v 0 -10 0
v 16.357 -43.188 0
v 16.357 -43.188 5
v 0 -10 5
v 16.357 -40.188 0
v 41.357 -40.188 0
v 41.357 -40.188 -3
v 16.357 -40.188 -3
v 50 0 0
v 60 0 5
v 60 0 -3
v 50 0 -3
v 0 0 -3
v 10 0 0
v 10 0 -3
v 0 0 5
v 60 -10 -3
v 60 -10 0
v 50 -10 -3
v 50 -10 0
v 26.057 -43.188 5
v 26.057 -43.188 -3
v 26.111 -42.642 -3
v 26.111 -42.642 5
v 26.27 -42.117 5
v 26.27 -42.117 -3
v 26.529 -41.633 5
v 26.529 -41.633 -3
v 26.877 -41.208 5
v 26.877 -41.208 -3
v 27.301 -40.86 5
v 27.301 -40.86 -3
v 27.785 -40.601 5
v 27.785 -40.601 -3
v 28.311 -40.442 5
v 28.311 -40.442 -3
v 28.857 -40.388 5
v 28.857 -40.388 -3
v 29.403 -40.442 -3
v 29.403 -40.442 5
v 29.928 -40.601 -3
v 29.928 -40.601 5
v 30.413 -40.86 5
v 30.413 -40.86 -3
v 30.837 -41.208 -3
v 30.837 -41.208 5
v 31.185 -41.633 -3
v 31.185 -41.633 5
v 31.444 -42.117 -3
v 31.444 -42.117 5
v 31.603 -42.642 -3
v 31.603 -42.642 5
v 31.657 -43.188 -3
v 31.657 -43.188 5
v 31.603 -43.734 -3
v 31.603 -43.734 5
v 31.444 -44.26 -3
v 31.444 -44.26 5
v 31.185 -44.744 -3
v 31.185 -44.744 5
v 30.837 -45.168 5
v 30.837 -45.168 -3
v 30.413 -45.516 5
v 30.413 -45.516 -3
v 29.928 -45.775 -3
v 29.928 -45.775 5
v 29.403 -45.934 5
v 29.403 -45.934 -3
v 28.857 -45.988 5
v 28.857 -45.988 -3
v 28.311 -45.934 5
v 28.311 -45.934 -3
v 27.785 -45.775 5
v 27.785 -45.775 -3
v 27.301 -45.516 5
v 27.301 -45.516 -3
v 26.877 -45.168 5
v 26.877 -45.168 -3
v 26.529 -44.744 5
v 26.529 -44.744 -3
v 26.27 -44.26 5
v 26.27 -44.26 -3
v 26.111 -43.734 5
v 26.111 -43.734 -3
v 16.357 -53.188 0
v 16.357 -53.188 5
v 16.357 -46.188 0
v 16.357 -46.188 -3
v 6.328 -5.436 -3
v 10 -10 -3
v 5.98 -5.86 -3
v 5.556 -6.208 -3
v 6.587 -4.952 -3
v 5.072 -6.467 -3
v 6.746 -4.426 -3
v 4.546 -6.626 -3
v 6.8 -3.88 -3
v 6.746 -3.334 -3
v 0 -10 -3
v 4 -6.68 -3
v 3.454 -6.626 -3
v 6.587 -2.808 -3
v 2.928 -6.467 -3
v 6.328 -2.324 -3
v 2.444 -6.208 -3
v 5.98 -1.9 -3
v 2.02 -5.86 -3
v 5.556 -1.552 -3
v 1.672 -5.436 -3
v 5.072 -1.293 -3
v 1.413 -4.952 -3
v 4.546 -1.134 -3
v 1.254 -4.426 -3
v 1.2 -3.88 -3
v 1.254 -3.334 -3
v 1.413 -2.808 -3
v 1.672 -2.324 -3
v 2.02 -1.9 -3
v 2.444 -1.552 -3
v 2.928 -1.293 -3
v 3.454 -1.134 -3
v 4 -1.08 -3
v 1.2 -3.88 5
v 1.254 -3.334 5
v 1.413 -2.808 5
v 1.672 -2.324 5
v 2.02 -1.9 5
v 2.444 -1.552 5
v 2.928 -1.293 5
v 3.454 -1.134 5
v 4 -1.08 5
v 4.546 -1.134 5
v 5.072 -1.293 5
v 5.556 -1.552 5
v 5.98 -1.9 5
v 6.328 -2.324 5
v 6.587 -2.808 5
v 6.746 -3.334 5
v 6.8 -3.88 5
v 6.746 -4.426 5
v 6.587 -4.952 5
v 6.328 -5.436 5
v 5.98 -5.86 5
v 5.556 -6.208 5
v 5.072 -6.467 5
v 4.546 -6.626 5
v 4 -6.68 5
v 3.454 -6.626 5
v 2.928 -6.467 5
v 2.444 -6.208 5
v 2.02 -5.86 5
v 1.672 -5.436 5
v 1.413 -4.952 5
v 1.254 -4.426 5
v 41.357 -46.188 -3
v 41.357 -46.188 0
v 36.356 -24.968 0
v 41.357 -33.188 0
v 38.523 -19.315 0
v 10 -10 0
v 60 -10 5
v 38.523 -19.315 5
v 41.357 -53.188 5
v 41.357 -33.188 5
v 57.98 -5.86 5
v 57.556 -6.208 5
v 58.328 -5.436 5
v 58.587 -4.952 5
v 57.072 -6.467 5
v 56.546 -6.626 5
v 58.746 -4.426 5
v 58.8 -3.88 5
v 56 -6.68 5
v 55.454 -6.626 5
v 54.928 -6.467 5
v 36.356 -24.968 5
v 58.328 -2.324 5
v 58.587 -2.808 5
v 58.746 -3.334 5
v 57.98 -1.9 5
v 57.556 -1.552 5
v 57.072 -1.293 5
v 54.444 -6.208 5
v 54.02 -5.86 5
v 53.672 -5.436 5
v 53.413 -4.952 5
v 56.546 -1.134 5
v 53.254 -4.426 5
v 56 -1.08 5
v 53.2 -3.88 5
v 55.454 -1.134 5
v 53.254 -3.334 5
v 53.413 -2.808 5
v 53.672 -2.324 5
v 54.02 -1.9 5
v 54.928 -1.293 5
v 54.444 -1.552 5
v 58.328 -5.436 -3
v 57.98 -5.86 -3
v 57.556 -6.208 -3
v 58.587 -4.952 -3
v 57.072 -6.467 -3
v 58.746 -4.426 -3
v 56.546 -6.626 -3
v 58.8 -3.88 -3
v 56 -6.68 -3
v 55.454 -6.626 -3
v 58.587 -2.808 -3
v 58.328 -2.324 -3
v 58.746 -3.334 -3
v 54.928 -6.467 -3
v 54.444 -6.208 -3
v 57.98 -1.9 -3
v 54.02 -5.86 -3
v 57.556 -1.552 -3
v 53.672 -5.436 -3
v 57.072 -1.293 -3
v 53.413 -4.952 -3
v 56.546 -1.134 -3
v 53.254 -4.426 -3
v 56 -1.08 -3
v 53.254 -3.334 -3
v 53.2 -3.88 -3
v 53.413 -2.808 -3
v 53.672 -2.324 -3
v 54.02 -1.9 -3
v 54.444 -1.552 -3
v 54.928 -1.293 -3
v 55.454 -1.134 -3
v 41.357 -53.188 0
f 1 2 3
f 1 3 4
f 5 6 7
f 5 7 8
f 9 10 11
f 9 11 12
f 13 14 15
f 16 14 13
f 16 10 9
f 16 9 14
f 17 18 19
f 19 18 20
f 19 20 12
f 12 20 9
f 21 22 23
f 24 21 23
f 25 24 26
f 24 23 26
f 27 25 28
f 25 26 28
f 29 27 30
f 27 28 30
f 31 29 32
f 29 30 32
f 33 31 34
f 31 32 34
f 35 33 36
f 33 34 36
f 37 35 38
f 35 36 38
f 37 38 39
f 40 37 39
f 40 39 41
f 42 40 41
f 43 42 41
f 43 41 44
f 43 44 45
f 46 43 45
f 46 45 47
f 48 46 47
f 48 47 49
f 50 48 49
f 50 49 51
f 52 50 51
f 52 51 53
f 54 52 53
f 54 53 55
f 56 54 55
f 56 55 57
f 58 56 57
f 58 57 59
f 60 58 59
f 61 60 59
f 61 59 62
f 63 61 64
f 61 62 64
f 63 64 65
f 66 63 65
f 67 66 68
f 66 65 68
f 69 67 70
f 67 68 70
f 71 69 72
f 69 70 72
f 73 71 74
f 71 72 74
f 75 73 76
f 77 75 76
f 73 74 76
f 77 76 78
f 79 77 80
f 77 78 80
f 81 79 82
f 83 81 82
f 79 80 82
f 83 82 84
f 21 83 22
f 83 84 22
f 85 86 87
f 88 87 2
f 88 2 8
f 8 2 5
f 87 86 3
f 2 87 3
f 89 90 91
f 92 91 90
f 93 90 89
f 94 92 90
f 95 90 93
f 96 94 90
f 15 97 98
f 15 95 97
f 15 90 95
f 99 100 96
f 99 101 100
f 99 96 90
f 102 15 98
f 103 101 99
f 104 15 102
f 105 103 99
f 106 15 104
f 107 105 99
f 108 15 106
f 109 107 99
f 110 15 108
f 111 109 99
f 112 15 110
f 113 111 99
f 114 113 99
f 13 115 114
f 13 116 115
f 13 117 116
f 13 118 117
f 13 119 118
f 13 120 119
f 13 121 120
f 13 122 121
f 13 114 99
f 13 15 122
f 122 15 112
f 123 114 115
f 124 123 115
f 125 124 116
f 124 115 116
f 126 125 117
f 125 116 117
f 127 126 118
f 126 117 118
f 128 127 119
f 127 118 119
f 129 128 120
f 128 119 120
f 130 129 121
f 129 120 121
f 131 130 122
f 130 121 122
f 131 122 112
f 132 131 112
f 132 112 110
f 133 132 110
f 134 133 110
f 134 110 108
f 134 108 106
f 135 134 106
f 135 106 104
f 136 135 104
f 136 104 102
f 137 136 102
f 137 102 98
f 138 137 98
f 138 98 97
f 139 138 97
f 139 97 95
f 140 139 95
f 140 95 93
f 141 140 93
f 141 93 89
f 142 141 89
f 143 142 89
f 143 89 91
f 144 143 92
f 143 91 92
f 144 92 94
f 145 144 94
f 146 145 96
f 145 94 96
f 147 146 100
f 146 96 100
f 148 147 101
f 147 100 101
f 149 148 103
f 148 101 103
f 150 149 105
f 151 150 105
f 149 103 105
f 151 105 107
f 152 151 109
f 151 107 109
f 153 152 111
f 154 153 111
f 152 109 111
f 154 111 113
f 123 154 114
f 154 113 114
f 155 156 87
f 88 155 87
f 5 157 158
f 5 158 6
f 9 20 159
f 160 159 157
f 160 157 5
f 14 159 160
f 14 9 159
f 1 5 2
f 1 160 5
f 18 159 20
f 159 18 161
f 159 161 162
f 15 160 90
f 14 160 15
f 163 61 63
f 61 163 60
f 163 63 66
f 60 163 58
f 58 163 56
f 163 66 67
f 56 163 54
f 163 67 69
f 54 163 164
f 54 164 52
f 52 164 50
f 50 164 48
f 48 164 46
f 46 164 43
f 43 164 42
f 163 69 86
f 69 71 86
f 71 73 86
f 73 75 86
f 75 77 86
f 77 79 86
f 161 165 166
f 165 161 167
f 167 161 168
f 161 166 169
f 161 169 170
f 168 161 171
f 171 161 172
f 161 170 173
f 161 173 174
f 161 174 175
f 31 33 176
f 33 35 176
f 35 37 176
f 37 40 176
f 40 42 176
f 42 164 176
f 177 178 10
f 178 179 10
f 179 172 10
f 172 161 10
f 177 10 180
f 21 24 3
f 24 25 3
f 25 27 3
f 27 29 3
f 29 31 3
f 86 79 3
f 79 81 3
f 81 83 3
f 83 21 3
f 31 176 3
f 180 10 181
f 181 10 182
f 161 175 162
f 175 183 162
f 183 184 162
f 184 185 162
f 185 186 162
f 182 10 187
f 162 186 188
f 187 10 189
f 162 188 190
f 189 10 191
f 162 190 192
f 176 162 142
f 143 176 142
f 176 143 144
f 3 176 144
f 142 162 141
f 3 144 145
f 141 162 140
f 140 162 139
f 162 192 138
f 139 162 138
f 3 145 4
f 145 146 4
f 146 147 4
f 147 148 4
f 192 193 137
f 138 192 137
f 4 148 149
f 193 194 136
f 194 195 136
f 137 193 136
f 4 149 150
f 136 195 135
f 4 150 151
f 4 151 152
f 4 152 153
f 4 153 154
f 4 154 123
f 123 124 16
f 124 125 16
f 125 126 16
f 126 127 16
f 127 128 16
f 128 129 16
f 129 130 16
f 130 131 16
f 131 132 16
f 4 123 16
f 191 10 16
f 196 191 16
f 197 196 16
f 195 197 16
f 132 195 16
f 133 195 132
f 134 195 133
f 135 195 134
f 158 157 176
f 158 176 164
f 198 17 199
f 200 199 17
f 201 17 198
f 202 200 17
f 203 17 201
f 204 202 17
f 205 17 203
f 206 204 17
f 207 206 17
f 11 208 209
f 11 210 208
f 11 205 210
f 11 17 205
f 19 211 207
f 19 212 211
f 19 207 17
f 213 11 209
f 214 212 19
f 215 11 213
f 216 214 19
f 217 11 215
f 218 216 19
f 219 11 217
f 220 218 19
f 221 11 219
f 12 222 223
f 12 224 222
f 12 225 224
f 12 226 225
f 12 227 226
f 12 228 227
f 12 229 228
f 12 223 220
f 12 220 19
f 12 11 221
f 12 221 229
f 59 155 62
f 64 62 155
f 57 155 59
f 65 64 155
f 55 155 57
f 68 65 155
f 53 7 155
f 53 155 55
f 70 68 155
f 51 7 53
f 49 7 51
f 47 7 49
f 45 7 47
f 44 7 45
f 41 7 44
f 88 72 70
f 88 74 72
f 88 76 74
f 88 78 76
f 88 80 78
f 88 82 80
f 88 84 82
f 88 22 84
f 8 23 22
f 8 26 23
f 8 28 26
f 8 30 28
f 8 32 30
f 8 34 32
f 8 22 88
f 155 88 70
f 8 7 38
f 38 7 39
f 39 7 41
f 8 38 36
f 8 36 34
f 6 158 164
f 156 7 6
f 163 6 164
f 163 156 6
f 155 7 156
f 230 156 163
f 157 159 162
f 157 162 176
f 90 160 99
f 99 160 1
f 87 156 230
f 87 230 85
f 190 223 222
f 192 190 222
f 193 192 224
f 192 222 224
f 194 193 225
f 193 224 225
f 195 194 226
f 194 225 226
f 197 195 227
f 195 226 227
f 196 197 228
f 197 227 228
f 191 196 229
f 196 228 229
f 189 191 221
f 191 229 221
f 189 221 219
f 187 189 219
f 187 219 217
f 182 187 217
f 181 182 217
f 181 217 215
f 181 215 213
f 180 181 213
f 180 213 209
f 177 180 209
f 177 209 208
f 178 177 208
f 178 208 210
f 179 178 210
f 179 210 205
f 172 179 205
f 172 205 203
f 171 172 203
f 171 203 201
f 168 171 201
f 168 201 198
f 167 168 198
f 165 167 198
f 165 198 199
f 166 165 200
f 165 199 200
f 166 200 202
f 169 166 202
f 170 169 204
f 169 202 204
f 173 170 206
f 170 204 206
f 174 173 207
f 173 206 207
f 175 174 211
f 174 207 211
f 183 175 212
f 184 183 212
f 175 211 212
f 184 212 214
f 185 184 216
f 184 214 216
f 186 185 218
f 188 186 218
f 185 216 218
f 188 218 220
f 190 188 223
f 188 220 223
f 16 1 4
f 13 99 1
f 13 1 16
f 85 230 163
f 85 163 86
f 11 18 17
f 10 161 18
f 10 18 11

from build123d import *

# Parameters (mm, degrees)
BOSS_EXTRU_1_DEPTH      = 5
ESQUISSE2_W             = 10
ESQUISSE2_H             = 10
ESQUISSE2_W_2           = 25
ESQUISSE2_H_2           = 6
BOSS_EXTRU_2_DEPTH      = 3
ESQUISSE3_R             = 2.8
ENL_V_MAT_EXTRU_3_DEPTH = 8.1


with BuildPart() as part:
    # Esquisse1 → Boss.-Extru.1 (new body)
    with BuildSketch(Plane.XY):
        Polygon((0, 0), (60, 0), (60, -10), (38.522739923, -19.314739888), (36.355716988, -24.967843196), (41.356924968, -33.188115427), (41.356924968, -53.188115427), (16.356924968, -53.188115427), (16.356924968, -43.188115427), (0, -10), align=None)
    extrude(amount=BOSS_EXTRU_1_DEPTH)

    # Esquisse2 → Boss.-Extru.2 (add)
    with BuildSketch(Plane(origin=(0, 0, 0), x_dir=(-1, 0, 0), z_dir=(0, 0, -1))):
        with Locations((-55, -5)):
            Rectangle(ESQUISSE2_W, ESQUISSE2_H)
        with Locations((-5, -5)):
            Rectangle(ESQUISSE2_W, ESQUISSE2_H)
        with Locations((-28.856924968, -43.188115427)):
            Rectangle(ESQUISSE2_W_2, ESQUISSE2_H_2)
    extrude(amount=BOSS_EXTRU_2_DEPTH)

    # Esquisse3 → Enlèv. mat.-Extru.3 (cut)
    with BuildSketch(Plane(origin=(0, 0, -3), x_dir=(-1, 0, 0), z_dir=(0, 0, -1))):
        with Locations((-56, -3.88)):
            Circle(ESQUISSE3_R)
        with Locations((-4, -3.88)):
            Circle(ESQUISSE3_R)
        with Locations((-28.856924968, -43.188115427)):
            Circle(ESQUISSE3_R)
    extrude(amount=-ENL_V_MAT_EXTRU_3_DEPTH, mode=Mode.SUBTRACT)


solid = part.part
